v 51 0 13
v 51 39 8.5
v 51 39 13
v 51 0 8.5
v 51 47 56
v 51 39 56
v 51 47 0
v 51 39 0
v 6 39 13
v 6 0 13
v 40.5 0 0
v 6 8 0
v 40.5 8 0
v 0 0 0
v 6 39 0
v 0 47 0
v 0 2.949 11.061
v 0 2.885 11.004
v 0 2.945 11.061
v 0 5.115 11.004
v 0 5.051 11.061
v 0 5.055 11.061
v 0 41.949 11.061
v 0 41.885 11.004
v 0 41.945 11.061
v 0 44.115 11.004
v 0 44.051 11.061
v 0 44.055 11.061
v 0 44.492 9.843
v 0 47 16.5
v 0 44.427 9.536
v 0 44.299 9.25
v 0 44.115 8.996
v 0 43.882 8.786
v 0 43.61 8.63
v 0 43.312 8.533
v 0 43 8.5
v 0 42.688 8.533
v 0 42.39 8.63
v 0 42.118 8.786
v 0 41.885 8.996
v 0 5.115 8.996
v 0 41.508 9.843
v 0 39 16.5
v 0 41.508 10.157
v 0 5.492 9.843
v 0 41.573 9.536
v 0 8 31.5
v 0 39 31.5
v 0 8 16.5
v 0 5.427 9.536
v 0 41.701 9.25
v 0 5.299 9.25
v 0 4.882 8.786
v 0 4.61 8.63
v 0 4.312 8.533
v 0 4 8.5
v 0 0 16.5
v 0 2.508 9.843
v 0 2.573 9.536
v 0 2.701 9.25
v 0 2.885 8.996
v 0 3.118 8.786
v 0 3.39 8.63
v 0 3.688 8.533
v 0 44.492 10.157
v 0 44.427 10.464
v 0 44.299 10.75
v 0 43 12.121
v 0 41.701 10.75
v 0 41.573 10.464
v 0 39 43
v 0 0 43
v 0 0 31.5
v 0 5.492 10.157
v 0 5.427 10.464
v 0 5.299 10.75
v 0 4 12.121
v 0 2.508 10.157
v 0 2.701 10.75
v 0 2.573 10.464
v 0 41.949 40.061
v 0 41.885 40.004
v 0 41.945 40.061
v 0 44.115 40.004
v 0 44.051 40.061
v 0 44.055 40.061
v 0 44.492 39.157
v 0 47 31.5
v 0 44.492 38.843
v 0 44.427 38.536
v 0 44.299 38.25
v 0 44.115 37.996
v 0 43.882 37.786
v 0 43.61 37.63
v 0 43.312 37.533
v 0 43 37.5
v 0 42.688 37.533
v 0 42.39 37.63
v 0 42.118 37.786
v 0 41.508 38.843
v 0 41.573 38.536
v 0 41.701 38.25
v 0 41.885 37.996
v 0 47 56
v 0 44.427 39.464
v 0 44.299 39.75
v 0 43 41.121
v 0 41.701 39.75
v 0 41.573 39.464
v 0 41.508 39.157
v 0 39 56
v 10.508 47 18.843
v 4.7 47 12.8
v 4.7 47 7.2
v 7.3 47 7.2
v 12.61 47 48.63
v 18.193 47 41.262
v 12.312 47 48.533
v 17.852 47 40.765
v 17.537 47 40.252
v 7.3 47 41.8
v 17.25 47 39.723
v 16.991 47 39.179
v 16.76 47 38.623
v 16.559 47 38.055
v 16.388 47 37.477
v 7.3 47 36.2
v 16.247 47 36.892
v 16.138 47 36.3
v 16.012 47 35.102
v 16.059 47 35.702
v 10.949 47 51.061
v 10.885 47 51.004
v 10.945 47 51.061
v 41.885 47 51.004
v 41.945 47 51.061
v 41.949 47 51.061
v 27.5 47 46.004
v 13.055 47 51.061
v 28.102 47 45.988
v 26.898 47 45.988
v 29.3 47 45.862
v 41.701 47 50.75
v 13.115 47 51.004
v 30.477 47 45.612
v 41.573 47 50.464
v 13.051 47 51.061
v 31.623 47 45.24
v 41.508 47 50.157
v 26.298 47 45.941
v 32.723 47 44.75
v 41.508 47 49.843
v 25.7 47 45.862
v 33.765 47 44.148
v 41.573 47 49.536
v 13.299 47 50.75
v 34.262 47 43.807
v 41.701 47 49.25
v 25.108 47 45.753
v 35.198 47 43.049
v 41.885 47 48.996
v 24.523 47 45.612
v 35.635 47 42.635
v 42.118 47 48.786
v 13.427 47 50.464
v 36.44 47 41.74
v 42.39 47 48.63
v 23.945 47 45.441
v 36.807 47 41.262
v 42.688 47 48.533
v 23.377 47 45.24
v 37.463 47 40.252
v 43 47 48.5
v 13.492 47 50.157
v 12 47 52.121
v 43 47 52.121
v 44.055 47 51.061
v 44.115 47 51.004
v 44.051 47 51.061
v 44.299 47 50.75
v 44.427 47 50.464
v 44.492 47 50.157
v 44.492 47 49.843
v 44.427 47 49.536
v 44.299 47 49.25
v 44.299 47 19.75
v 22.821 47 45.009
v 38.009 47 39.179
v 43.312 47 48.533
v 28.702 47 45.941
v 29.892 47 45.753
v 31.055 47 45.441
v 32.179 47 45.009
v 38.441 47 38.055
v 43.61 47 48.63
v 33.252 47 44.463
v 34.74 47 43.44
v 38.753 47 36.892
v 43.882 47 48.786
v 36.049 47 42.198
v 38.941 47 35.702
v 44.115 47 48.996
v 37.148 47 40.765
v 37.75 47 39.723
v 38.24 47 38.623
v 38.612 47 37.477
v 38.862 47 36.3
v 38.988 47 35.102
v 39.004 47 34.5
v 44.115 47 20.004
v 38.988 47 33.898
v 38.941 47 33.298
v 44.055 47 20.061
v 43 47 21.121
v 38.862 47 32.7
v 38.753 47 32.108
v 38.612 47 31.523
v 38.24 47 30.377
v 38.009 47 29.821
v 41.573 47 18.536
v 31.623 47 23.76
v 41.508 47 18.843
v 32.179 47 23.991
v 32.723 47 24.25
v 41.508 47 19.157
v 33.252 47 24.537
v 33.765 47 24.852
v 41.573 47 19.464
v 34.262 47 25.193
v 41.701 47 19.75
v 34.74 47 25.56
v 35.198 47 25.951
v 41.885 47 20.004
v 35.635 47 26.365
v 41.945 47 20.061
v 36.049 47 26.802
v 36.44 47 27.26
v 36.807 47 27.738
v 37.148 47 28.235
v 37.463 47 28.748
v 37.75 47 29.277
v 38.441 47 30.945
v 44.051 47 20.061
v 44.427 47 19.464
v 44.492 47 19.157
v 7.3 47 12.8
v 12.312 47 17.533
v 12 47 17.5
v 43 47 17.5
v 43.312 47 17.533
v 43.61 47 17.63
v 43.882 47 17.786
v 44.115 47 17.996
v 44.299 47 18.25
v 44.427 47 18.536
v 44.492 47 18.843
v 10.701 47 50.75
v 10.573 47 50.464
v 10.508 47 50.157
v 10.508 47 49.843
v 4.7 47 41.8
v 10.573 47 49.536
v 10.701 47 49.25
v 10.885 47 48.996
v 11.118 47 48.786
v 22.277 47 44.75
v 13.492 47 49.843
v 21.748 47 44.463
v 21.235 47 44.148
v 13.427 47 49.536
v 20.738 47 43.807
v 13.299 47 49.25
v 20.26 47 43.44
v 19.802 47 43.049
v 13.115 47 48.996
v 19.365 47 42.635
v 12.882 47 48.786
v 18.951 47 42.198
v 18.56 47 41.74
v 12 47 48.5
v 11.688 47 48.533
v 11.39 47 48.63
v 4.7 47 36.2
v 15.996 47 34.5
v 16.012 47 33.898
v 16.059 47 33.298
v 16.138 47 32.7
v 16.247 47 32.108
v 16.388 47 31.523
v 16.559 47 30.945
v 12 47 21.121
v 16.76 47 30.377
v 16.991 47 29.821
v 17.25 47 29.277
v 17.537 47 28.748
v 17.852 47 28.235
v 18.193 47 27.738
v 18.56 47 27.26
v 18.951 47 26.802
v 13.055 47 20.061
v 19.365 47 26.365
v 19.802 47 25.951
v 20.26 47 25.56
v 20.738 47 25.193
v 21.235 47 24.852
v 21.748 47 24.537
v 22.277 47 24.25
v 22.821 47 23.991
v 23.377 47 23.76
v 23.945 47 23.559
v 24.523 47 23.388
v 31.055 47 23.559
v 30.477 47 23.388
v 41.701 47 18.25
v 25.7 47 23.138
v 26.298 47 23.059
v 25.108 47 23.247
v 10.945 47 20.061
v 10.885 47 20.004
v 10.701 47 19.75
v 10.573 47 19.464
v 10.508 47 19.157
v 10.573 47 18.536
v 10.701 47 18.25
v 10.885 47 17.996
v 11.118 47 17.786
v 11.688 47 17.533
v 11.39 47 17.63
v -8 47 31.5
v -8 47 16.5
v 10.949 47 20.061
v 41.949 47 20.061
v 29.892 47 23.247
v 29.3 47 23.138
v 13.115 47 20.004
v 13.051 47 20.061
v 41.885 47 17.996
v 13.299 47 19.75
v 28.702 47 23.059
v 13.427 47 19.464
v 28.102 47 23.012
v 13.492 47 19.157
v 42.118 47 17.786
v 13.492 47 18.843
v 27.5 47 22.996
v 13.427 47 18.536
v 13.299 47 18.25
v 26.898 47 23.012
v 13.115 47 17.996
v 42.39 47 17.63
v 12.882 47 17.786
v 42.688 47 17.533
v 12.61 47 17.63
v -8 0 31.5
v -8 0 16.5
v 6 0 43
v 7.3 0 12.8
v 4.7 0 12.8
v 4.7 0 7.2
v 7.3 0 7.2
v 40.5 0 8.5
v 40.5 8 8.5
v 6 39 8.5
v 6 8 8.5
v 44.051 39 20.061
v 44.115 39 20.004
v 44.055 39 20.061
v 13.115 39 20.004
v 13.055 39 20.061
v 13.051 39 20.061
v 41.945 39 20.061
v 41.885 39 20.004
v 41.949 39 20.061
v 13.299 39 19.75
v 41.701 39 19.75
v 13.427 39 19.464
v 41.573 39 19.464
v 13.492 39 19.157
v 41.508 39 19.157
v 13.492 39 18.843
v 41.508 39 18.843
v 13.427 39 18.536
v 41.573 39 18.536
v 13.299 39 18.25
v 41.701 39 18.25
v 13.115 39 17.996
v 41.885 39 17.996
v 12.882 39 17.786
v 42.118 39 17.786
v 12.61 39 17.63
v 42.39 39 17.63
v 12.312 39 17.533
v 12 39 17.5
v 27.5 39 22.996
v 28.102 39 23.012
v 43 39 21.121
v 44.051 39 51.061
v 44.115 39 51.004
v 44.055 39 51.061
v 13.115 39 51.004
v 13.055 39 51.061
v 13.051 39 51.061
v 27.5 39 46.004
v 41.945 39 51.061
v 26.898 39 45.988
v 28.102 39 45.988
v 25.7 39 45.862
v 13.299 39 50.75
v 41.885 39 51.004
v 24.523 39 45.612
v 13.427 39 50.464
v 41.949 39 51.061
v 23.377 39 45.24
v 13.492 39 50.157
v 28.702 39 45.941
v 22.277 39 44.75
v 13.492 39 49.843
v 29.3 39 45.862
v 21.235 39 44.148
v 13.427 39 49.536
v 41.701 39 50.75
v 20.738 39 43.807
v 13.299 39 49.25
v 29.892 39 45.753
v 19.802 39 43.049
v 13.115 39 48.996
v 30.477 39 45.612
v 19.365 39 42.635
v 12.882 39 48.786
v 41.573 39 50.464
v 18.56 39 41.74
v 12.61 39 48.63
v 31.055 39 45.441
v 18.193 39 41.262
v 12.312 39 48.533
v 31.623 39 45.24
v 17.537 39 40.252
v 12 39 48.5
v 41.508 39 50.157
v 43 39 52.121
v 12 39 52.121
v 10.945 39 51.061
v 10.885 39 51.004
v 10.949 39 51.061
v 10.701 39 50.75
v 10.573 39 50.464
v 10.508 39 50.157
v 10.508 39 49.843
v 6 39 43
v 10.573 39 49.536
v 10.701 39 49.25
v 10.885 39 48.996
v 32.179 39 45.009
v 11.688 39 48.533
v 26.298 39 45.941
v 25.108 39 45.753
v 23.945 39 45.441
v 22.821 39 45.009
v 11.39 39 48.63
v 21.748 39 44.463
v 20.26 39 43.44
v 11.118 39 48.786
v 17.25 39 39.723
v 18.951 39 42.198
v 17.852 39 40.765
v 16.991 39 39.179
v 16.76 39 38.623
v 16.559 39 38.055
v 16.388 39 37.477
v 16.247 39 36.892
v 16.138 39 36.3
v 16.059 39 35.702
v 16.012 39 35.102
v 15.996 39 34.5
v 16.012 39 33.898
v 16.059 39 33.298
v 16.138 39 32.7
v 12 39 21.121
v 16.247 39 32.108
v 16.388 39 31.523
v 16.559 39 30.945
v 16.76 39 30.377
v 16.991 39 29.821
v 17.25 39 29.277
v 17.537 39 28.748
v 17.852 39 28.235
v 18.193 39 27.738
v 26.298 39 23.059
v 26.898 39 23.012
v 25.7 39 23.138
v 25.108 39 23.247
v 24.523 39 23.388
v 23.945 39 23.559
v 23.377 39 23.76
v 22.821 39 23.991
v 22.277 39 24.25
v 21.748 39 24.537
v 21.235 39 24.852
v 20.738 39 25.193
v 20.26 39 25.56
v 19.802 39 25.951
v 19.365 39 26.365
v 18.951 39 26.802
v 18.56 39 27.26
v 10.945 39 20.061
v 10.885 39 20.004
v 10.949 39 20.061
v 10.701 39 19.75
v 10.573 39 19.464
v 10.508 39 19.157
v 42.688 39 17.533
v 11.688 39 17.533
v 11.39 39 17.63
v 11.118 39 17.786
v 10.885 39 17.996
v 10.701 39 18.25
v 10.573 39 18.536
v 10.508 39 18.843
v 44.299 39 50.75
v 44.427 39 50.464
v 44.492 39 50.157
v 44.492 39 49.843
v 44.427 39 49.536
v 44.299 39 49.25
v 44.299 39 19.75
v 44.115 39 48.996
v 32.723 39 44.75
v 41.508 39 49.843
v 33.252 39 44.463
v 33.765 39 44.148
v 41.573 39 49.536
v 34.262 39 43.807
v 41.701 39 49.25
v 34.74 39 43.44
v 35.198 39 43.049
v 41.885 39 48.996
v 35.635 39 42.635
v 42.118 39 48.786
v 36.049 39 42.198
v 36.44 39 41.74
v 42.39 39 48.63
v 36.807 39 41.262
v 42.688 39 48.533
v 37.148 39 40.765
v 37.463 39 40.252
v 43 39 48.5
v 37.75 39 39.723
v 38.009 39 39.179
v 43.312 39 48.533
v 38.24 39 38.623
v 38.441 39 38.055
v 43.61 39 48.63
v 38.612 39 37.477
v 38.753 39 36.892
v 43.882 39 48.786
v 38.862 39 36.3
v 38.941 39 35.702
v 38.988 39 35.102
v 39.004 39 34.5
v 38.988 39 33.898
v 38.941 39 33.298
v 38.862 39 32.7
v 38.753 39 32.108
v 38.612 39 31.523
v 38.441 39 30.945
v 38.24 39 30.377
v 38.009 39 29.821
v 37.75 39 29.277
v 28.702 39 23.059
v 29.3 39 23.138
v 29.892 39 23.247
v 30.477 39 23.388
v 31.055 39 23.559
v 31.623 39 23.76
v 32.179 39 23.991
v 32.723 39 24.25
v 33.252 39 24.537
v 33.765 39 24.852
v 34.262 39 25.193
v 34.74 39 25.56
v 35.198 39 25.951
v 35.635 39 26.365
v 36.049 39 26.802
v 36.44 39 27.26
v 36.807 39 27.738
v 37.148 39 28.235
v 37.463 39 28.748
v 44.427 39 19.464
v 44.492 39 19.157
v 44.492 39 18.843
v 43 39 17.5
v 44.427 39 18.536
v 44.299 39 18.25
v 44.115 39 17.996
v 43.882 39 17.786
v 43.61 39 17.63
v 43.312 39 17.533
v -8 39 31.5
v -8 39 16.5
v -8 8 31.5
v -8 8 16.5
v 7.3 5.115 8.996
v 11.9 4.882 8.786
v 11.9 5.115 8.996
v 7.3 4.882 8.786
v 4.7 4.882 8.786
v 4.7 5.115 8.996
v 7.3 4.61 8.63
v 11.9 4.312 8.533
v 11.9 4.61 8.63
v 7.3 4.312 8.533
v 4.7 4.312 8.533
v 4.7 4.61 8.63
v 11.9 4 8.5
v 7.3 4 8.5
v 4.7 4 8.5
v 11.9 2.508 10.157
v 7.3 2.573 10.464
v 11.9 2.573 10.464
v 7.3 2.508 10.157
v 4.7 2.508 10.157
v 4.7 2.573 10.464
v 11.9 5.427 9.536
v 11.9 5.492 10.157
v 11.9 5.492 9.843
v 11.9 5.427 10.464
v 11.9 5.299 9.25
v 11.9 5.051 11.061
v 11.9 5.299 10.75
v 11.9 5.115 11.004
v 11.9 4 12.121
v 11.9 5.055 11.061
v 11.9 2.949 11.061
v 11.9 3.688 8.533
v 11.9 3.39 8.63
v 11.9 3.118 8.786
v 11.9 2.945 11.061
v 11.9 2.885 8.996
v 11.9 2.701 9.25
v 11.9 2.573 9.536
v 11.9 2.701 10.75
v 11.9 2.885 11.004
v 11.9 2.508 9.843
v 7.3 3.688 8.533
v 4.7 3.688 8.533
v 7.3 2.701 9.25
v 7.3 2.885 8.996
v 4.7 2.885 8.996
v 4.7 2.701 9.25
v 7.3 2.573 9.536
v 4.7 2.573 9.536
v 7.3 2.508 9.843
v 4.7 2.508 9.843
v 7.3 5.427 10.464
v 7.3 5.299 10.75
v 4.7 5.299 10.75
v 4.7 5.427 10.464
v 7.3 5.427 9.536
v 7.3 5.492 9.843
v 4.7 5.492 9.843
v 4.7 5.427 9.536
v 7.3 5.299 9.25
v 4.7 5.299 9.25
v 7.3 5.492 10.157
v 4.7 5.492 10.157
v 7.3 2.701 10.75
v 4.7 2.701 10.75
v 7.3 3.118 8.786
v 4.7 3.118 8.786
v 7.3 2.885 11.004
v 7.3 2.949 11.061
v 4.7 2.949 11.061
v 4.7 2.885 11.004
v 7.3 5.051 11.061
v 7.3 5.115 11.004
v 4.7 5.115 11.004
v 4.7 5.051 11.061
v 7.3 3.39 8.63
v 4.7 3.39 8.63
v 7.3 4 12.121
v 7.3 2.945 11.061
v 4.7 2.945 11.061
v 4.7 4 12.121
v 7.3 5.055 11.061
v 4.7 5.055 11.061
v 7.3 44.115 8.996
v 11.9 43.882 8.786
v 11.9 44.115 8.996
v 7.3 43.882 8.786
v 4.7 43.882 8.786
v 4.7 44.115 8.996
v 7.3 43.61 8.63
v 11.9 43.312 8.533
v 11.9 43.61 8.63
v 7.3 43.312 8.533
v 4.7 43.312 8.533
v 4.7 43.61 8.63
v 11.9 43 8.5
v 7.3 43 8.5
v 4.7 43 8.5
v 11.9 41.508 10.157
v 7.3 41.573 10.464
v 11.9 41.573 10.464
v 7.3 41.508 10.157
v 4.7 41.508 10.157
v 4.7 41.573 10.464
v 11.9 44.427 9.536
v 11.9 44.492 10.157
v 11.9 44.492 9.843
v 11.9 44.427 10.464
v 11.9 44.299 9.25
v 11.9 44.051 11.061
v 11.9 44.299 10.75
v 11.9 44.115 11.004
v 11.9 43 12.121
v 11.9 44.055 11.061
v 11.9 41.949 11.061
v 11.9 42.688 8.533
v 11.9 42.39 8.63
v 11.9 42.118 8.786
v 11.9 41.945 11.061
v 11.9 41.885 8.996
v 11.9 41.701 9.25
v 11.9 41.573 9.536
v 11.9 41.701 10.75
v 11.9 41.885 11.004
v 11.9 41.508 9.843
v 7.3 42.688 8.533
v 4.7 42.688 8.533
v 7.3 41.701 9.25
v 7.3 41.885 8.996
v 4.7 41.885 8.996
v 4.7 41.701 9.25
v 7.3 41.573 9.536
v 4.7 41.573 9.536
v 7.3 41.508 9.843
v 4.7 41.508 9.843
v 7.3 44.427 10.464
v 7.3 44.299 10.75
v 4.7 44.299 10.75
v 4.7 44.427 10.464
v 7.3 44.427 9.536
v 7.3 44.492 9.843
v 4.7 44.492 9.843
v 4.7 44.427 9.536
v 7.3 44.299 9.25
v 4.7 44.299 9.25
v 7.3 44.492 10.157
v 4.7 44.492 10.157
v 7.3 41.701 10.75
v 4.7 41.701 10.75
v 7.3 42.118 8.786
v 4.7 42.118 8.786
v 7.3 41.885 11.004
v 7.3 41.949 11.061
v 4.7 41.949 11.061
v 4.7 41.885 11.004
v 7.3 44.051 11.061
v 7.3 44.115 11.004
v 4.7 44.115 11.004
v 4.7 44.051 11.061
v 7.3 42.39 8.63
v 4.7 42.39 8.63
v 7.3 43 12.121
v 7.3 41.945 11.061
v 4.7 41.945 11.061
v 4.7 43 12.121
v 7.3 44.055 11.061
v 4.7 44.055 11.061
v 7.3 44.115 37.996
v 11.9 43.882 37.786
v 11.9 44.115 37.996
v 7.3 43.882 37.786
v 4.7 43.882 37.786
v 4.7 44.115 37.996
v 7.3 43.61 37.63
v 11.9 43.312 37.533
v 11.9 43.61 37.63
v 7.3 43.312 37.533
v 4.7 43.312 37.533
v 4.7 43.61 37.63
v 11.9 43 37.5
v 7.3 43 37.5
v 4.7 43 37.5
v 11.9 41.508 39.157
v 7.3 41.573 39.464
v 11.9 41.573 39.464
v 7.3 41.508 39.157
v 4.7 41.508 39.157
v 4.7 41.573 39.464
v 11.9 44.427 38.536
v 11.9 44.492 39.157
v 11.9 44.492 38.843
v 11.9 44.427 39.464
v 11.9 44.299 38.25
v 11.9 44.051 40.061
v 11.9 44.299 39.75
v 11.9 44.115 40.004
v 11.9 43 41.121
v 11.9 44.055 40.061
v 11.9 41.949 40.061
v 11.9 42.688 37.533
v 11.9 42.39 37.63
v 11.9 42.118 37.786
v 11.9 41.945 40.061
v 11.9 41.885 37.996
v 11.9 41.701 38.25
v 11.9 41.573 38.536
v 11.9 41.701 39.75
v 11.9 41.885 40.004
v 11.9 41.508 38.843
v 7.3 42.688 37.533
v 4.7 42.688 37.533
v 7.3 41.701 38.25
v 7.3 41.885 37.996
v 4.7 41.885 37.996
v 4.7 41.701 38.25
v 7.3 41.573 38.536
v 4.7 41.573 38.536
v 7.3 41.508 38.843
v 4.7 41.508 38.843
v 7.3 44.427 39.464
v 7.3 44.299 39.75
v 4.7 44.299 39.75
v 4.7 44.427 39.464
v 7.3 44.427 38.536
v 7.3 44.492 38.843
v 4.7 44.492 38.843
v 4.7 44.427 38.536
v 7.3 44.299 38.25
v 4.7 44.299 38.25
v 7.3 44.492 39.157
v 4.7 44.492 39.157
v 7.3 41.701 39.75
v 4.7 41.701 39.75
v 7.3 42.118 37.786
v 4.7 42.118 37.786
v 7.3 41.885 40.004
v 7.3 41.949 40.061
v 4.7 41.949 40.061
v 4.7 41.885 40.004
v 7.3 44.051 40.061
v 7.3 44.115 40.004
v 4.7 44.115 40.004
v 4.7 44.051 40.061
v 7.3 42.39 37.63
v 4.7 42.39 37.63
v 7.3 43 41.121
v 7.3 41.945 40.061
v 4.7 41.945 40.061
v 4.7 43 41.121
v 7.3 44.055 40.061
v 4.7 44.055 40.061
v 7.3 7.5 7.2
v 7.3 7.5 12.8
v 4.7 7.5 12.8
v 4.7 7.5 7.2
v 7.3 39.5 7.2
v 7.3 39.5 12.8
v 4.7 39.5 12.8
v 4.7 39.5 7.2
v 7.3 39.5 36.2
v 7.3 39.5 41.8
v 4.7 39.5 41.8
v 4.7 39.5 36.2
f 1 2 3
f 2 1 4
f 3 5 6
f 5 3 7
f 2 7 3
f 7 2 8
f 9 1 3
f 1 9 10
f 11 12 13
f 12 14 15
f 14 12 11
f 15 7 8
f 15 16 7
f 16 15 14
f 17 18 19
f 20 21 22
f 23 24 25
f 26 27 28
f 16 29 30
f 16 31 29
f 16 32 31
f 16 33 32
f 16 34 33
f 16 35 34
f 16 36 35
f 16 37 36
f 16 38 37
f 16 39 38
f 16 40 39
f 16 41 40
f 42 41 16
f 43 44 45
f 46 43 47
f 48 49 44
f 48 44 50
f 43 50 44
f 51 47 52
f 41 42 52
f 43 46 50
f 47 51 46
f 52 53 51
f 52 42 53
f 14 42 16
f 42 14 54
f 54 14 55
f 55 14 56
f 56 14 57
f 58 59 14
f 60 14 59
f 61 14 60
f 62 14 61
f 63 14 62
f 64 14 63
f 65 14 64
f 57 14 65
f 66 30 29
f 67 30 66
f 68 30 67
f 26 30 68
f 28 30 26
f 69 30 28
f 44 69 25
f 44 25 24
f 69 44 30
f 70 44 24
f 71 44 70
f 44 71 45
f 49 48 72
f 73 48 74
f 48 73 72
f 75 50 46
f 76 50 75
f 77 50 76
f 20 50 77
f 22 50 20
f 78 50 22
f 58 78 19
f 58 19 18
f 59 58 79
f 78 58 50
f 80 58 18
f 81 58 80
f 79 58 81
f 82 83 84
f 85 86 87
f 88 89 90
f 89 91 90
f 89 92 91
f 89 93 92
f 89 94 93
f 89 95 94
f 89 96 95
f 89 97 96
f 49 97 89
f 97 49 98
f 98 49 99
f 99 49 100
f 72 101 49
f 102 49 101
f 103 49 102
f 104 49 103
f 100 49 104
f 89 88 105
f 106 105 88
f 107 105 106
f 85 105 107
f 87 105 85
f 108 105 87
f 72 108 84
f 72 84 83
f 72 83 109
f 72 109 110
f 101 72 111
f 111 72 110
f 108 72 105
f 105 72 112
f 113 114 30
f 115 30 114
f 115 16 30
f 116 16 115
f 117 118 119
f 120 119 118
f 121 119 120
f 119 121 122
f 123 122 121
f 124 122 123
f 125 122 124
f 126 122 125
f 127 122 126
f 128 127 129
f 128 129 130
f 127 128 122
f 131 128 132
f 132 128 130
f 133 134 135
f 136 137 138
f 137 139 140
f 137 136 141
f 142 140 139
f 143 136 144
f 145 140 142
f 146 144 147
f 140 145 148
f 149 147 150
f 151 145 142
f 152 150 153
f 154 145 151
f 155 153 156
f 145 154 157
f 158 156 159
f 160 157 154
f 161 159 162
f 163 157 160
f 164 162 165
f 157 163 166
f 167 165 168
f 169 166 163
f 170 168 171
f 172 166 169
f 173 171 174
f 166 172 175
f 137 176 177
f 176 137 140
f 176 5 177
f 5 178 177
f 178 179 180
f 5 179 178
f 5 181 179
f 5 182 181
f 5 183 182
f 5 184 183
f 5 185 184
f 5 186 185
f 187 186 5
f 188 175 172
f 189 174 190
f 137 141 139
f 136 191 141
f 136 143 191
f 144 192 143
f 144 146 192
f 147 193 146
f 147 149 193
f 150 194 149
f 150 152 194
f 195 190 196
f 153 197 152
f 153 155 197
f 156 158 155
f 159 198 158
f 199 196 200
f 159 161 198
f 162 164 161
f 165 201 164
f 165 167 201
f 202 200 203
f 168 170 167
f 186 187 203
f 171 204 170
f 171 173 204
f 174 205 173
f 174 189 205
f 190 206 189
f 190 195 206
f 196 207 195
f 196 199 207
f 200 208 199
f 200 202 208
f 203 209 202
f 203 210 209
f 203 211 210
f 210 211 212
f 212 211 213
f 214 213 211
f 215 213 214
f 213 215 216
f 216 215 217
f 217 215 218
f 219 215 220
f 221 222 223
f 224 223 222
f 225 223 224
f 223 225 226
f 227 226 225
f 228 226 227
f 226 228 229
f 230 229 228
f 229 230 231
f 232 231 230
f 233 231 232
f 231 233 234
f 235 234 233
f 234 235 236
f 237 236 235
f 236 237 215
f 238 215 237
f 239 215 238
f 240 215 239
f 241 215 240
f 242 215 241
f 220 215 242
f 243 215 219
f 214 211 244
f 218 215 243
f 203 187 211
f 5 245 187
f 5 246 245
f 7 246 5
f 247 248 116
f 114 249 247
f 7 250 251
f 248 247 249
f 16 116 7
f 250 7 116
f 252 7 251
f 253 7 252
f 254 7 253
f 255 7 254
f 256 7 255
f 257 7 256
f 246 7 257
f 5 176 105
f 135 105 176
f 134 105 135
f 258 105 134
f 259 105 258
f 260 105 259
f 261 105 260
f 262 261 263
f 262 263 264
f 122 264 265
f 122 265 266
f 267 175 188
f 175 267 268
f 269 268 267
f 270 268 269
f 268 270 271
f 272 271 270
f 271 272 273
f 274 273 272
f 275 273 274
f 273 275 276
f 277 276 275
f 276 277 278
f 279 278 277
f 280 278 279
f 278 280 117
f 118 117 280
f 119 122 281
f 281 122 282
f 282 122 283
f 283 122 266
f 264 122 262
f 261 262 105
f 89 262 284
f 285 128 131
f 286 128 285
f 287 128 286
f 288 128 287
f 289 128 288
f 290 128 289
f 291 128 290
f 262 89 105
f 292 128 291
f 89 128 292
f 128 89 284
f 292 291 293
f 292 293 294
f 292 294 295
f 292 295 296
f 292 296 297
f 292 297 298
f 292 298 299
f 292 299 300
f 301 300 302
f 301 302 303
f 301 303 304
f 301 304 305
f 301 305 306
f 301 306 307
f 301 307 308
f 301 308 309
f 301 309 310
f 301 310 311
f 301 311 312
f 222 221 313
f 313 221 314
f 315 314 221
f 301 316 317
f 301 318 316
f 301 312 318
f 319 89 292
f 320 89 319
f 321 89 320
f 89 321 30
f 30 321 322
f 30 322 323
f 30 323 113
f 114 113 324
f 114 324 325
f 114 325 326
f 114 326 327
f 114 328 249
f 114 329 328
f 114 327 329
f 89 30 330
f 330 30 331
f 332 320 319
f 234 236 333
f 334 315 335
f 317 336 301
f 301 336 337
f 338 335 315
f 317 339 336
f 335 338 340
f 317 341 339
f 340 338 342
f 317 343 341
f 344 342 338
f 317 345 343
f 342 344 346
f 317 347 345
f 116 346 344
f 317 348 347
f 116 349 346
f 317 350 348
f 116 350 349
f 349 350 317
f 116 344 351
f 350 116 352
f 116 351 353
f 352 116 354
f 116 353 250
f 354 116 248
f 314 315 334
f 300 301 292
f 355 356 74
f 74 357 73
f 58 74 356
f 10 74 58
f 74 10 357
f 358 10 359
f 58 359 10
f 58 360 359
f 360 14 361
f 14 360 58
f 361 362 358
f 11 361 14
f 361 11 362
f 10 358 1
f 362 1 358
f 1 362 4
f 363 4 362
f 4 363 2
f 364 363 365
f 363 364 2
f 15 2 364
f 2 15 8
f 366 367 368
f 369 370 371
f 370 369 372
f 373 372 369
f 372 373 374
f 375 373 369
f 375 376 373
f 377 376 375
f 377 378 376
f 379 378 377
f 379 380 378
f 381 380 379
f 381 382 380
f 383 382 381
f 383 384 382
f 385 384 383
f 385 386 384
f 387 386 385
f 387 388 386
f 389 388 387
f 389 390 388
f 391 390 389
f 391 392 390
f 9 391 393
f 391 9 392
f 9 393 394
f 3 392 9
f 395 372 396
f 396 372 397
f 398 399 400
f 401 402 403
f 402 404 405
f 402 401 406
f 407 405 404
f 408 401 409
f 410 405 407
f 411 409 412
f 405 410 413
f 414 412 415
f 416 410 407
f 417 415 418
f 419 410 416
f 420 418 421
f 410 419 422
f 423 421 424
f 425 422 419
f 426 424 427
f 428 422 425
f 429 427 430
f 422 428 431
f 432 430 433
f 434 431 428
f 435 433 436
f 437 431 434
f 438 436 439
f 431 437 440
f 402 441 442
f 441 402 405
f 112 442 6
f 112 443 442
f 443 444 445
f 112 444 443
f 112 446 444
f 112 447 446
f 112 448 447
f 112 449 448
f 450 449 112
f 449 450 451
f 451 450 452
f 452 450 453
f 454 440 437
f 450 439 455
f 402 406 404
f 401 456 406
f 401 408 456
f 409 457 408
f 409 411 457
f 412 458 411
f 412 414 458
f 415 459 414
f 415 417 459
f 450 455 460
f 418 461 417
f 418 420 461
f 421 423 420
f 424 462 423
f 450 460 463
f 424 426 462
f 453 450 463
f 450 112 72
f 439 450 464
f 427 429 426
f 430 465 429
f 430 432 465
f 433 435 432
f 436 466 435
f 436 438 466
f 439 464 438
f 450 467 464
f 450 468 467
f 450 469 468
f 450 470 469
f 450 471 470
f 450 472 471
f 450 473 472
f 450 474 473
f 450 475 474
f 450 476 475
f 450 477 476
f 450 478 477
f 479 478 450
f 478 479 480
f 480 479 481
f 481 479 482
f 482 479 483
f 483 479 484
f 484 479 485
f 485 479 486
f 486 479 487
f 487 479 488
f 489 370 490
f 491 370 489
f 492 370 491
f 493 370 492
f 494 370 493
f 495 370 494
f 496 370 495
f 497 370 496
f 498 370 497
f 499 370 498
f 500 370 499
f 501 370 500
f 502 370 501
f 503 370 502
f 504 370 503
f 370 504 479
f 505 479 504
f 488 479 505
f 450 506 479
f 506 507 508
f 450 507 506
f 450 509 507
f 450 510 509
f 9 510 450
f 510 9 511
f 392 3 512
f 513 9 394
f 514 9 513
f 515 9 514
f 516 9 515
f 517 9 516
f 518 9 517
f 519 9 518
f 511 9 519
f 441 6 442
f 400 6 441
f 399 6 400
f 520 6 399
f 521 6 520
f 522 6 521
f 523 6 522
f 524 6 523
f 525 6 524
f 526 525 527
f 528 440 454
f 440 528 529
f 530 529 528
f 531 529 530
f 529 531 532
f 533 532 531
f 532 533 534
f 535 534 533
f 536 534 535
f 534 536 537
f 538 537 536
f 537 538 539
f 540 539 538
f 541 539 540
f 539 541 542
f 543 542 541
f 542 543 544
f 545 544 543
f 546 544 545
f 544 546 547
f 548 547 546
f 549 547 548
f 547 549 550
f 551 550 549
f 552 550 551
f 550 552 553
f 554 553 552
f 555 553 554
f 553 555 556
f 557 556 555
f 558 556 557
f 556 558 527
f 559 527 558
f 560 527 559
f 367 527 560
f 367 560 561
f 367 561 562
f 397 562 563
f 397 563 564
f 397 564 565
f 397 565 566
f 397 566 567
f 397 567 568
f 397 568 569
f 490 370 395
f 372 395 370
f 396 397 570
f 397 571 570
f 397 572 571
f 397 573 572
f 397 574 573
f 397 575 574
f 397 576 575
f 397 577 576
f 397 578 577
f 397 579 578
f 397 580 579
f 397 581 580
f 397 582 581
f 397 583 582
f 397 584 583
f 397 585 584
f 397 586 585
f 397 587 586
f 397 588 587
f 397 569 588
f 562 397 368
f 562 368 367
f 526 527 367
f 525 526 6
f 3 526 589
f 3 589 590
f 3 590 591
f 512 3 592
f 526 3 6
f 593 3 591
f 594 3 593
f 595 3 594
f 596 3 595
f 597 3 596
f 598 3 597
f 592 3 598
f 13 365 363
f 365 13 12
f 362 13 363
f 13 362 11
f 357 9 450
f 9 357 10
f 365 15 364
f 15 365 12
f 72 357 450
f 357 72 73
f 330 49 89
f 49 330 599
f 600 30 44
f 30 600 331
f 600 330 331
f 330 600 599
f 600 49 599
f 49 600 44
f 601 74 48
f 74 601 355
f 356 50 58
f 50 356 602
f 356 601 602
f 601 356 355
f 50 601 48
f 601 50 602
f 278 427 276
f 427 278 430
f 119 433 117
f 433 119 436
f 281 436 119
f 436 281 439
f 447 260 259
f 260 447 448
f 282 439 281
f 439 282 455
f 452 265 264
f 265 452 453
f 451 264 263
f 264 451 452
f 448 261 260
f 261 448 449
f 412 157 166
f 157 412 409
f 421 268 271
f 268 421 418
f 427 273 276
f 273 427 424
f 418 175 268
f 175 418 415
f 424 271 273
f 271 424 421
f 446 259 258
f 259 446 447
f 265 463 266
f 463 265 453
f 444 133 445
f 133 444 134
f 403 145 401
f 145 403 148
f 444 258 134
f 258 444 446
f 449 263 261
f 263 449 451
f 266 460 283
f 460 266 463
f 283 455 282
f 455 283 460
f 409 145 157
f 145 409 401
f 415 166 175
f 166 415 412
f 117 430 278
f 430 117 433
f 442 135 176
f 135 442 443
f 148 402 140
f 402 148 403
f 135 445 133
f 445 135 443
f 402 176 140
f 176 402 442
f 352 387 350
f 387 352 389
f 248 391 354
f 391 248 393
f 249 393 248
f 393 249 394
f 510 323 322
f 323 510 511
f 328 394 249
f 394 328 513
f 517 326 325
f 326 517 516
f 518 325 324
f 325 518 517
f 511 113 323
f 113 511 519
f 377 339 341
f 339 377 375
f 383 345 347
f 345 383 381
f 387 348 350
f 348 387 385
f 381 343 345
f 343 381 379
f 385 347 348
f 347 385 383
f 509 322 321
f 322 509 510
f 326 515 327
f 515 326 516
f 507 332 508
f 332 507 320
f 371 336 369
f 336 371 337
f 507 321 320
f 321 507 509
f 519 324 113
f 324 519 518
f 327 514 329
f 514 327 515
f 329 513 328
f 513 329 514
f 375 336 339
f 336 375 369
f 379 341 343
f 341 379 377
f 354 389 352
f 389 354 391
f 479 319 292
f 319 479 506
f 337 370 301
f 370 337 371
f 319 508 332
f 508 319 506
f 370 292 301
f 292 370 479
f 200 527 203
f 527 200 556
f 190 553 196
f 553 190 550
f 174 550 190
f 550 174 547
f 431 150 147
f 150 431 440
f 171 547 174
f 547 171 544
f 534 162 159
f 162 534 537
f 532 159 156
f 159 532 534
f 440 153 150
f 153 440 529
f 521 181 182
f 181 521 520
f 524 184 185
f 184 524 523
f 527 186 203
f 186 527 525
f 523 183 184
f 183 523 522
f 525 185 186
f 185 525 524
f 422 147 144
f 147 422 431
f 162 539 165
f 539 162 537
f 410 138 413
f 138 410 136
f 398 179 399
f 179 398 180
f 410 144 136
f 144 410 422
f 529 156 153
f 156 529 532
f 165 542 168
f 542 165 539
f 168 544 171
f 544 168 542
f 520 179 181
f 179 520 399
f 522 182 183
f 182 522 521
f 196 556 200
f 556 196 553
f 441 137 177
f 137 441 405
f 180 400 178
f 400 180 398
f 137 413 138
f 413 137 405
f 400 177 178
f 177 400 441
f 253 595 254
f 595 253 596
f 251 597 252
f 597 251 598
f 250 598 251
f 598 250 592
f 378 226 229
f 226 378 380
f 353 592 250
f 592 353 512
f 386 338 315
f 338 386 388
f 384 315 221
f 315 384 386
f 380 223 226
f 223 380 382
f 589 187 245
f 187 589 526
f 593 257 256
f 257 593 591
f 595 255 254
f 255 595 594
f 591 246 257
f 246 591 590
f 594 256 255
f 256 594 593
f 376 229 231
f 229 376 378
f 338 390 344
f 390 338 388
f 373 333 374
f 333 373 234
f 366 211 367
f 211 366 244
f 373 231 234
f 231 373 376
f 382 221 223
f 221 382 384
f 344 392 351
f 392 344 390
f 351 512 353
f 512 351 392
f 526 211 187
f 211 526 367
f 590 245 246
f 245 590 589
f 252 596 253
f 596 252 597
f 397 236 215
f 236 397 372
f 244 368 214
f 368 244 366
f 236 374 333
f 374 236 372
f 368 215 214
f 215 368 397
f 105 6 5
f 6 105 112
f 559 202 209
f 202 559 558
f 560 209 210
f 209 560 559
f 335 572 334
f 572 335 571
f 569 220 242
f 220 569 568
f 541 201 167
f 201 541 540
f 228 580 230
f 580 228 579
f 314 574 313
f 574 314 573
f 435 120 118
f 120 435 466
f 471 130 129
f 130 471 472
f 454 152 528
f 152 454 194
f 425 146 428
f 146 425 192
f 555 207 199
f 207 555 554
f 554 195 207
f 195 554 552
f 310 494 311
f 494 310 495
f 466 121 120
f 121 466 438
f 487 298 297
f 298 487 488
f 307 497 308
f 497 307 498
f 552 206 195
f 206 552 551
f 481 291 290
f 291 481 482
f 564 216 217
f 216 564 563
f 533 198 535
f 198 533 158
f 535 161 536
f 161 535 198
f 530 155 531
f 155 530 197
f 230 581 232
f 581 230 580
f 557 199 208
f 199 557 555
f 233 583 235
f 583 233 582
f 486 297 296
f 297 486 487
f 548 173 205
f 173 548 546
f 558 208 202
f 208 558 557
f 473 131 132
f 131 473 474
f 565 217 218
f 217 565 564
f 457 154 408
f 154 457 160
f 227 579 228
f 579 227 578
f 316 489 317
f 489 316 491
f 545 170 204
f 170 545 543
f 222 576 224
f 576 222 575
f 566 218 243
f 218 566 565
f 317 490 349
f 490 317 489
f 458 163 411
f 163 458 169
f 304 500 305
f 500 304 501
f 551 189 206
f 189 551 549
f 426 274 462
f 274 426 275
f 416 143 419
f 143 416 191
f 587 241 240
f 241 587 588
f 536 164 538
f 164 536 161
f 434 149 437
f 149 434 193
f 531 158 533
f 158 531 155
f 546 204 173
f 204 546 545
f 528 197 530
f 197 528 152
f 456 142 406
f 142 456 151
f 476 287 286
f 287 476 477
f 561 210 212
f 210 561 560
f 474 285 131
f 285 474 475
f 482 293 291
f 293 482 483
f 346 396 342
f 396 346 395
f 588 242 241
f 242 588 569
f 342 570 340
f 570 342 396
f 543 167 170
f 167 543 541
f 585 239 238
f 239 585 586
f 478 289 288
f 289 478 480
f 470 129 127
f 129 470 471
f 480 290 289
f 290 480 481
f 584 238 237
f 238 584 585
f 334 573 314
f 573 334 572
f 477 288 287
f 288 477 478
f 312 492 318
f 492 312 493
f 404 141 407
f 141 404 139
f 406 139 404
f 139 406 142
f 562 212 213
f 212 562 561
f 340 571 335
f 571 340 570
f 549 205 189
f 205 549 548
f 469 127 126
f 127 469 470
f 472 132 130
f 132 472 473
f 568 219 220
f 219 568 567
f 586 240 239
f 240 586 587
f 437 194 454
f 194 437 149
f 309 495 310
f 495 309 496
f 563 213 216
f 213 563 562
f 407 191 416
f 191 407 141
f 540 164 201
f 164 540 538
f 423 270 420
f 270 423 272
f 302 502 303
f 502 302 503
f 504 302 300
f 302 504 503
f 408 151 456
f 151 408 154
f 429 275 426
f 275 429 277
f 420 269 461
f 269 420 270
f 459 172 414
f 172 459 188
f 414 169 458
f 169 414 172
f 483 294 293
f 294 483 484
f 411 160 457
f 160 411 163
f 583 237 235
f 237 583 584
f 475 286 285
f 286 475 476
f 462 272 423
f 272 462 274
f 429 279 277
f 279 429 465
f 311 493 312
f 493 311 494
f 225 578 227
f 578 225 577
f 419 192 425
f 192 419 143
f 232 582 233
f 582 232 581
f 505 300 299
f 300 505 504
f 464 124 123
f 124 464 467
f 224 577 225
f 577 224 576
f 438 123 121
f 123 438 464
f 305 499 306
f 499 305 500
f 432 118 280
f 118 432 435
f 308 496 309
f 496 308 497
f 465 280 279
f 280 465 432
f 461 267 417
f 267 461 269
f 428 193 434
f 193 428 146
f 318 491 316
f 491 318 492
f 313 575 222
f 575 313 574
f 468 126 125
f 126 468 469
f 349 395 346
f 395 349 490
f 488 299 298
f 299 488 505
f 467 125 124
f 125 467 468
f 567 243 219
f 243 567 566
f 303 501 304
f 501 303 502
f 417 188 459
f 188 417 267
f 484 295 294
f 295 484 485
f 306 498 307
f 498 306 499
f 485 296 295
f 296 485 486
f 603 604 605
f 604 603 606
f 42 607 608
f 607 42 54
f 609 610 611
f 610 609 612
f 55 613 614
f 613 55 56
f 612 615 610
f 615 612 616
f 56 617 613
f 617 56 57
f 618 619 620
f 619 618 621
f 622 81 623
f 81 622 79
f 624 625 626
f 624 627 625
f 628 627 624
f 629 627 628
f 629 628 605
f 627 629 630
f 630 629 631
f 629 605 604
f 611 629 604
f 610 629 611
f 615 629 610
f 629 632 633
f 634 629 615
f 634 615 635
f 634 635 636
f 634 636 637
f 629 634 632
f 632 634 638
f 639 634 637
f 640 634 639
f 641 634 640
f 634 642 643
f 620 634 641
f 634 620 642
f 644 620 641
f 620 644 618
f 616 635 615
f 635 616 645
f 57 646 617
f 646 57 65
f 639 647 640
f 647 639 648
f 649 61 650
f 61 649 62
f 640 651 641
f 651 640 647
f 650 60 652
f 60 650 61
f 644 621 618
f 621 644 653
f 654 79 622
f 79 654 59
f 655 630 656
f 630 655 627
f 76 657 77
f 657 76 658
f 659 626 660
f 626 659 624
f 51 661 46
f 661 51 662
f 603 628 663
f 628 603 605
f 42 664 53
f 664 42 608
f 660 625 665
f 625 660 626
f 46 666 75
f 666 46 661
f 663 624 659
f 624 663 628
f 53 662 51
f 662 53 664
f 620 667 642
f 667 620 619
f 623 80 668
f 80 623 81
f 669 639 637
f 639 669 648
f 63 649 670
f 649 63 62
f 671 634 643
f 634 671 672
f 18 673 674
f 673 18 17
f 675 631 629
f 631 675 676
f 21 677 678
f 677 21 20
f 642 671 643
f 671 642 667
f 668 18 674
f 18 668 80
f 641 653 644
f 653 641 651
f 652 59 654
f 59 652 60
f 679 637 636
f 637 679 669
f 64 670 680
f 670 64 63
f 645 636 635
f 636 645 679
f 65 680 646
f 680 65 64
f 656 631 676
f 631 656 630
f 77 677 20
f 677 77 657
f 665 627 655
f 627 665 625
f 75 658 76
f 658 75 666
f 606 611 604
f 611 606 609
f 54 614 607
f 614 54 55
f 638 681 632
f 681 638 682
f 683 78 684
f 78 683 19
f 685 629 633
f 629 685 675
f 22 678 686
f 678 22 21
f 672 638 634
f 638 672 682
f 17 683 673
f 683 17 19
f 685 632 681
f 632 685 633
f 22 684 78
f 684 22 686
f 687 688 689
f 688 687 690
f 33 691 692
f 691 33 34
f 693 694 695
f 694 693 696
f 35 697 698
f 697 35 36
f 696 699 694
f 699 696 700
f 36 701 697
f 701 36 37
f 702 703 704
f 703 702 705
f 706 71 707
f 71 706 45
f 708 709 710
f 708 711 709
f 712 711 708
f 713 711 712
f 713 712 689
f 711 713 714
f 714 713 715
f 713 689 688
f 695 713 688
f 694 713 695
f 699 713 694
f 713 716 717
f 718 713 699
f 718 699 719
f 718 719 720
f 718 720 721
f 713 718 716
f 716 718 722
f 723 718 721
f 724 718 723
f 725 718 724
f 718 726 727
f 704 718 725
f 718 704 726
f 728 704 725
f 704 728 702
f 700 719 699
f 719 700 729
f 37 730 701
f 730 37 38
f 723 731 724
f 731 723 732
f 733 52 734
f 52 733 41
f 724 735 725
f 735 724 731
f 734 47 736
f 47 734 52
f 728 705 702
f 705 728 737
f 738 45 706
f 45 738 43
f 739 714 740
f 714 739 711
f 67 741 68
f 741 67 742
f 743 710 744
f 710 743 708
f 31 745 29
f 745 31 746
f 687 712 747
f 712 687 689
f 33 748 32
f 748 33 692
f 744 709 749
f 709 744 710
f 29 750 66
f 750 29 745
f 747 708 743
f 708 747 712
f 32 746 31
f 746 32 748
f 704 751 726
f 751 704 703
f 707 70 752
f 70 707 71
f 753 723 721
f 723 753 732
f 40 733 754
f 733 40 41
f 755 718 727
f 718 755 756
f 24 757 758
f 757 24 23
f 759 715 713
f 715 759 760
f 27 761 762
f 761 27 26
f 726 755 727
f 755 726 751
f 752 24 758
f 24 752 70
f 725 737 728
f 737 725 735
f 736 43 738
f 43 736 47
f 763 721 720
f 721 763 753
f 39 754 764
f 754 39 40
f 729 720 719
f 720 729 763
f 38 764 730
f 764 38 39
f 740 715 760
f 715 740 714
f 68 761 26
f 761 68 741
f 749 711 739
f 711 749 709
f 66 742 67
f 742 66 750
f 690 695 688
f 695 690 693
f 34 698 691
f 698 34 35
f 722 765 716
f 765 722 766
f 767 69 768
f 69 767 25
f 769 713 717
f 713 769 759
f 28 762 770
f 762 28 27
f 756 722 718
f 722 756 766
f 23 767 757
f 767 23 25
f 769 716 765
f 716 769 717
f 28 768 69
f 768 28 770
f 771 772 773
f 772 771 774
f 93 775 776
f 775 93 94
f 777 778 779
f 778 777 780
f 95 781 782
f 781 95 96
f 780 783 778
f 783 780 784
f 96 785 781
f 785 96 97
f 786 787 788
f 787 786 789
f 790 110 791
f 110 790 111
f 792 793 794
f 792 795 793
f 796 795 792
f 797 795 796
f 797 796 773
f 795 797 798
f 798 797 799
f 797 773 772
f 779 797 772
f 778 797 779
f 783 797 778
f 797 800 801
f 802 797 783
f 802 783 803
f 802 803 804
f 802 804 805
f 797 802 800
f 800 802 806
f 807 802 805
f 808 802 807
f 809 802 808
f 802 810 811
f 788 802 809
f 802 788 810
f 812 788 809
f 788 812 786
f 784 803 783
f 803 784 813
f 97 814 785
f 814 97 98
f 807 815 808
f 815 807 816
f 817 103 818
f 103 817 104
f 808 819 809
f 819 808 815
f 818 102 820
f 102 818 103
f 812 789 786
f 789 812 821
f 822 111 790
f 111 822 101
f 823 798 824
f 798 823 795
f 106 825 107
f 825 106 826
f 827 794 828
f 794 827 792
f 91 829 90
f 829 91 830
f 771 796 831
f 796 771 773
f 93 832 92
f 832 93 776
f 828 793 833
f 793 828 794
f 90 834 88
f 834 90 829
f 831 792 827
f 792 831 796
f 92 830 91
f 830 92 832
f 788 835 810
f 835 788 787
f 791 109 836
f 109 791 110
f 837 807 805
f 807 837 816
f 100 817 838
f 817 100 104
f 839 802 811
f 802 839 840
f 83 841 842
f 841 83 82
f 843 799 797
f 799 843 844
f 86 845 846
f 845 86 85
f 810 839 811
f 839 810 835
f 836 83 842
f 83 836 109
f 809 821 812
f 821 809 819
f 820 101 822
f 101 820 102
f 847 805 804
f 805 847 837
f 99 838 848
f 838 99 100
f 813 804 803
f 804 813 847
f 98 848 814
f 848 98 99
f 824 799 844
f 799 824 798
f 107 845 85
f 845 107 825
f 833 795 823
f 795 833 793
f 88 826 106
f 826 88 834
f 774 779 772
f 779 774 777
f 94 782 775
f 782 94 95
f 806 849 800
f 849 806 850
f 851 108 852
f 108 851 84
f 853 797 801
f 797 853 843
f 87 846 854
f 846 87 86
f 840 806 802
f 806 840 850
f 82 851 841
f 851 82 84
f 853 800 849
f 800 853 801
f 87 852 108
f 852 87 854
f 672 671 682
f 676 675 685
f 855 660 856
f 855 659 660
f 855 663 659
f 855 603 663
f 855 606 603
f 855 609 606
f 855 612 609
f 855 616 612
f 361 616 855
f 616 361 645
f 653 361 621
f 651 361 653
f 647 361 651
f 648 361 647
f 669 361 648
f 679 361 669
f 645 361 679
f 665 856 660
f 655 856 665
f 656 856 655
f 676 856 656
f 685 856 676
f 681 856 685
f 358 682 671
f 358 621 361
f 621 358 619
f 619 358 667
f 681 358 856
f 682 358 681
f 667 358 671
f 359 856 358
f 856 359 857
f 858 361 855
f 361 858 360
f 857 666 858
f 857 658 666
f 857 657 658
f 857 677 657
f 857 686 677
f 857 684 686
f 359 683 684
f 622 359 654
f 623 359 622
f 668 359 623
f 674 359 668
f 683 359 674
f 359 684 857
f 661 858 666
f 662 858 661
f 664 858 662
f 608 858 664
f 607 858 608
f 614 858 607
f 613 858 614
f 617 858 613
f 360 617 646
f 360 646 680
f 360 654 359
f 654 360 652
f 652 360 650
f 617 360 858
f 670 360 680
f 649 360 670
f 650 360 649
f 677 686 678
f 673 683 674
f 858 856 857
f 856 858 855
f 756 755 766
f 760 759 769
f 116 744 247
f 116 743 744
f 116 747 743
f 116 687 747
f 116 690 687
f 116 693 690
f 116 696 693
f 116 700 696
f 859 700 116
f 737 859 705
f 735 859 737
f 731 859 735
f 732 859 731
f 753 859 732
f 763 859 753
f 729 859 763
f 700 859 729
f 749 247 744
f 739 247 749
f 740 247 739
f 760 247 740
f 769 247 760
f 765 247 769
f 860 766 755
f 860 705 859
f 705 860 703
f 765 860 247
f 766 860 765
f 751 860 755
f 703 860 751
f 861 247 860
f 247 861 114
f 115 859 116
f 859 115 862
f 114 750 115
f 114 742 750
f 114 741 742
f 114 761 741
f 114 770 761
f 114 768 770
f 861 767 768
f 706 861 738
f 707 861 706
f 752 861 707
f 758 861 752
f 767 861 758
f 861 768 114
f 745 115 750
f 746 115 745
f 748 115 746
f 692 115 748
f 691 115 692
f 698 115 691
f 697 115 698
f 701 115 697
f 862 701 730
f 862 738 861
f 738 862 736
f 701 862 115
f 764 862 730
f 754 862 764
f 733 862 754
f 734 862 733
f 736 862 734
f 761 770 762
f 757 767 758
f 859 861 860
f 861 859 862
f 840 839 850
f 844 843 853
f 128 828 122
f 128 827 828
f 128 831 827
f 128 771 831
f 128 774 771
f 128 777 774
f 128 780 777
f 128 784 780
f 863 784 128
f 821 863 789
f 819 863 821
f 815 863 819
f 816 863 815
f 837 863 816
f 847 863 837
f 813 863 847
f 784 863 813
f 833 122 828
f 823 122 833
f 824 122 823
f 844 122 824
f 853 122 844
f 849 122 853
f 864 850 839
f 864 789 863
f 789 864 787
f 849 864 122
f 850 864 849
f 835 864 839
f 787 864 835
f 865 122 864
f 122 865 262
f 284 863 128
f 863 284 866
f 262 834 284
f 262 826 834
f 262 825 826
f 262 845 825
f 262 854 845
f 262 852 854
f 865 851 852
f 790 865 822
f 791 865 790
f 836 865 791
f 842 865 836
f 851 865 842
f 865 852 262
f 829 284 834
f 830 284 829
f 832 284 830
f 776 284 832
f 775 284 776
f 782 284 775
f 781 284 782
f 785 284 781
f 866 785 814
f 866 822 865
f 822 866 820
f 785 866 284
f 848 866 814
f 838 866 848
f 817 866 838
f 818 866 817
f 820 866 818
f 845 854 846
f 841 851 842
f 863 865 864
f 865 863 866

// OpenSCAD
// Customizable Y Motor Mount for Anet A6
// Copyright: Olle Wreede 2019
// License: CC BY-SA

//CUSTOMIZER VARIABLES

// Thickness in mm of backplate
backplate_thickness = 6; // [4:10]

// Height in mm of cutout of bottom
bottom_cutout_height = 8.5; // [6:0.5:10]

// Distance in mm that motor is lowered from default height
motor_lowered_by = 2; // [0:0.1:4]

// Width in mm of hole for back frame brace
width_of_opening_for_back_frame_brace = 10.5; // [0:15]

// Use round or teardrop mount holes
type_of_mount_hole = "Teardrop"; // [Teardrop, Round]

// Diameter in mm of mount hole
mount_hole_diameter = 3; // [2:0.1:4]

// Length in mm of mount hole
mount_hole_length = 12; // [8:0.1:14]

// Depth in mm of hole for trapped nut
depth_of_trapped_nut_hole = 2.6; // [2:0.1:4]

// Width in mm of hole for trapped nut
width_of_trapped_nut_hole = 7.5; // [6:0.1:10]

// Height in mm of hole for trapped nut
height_of_trapped_nut_hole = 5.6; // [4:0.1:8]

//CUSTOMIZER VARIABLES END

/* [Hidden] */

height_of_base = 15 - motor_lowered_by;

$fn=120;


/* From http://www.thingiverse.com/thing:3457
   © 2010 whosawhatsis */
module teardrop(radius, length, angle) {
	rotate([0, angle, 0]) union() {
		linear_extrude(height = length, center = true, convexity = radius, twist = 0)
			circle(r = radius, center = true, $fn = 30);
		linear_extrude(height = length, center = true, convexity = radius, twist = 0)
			projection(cut = false) rotate([0, -angle, 0]) translate([0, 0, radius * sin(45) * 1.5]) cylinder(h = radius * sin(45), r1 = radius * sin(45), r2 = 0, center = true, $fn = 30);
    }
}

module cylinder_outer(diameter, height, fn) {
   fudge = 1 / cos(180 / fn);
   cylinder(h=height, r=diameter / 2 * fudge, $fn=fn, center=true);
}

module mount_hole(diameter, length) {
    if (type_of_mount_hole == "Teardrop") {
        rotate([0, 270, 0])
        teardrop(diameter/2, length, 90);
    } else {
        cylinder_outer(diameter, length, $fn);
    }
}

module motor_mount_plate() {
    translate([51/2, 47 - 8/2, 56/2])
    difference() {
        cube([51, 8, 56], center=true);
        // Maybe decrease 0.1mm to add clearance for back frame brace
        
        // Motor shaft hole
        translate([6/3, 0, height_of_base/2])
        rotate([90, 0, 0])
        cylinder_outer(23, 8 + 0.1, $fn);
        
        // Motor mount holes
        translate([6/3 - 31/2, 0, height_of_base/2 + 31/2])
        rotate([90, 90, 0])
        mount_hole(mount_hole_diameter, 8 + 0.1, $fn);
        
        translate([6/3 - 31/2, 0, height_of_base/2 - 31/2])
        rotate([90, 90, 0])
        mount_hole(mount_hole_diameter, 8 + 0.1, $fn);
        
        translate([6/3 + 31/2, 0, height_of_base/2 + 31/2])
        rotate([90, 90, 0])
        mount_hole(mount_hole_diameter, 8 + 0.1, $fn);
 
        translate([6/3 + 31/2, 0, height_of_base/2 - 31/2])
        rotate([90, 90, 0])
        mount_hole(mount_hole_diameter, 8 + 0.1, $fn);
   }    
}

module bottom_plate() {
    translate([51/2, 47/2, height_of_base/2])
    difference() {
        cube([51, 47, height_of_base], center=true);
        // Optionally increase with 6mm to support dampener
        // Add holes in bottom to decrease plastic usage

        translate([0, 0, bottom_cutout_height/2 - height_of_base/2])
        cube([51, 31, bottom_cutout_height], center=true);

        // Leave opening for back frame brace
        if (width_of_opening_for_back_frame_brace > 0) {
            translate([51/2 - width_of_opening_for_back_frame_brace/2, 8/2 - 47/2, bottom_cutout_height/2 - height_of_base/2])
            cube([width_of_opening_for_back_frame_brace, 8, bottom_cutout_height], center=true);
        }
    }
}

module back_plate() {
    translate([3, 47/2, 43/2])
    cube([backplate_thickness, 47, 43], center=true);
    
    translate([-4, 47 - 8/2, 16.5 + 15/2])
    cube([8, 8, 15], center=true);
    
    translate([-4, 8/2, 16.5 + 15/2])
    cube([8, 8, 15], center=true);
}

module backplate_mount_holes() {
    translate([mount_hole_length/2 - 0.1, 4, 10])
    rotate([0, 90, 0])
    mount_hole(mount_hole_diameter, mount_hole_length);
    
    // Trapped nut hole
    translate([backplate_thickness, width_of_trapped_nut_hole/2, 10])
    cube([depth_of_trapped_nut_hole, width_of_trapped_nut_hole, height_of_trapped_nut_hole], center=true);

    translate([mount_hole_length/2 - 0.1, 47-4, 10])
    rotate([0, 90, 0])
    mount_hole(mount_hole_diameter, mount_hole_length);

    // Trapped nut hole
    translate([backplate_thickness, 47 - width_of_trapped_nut_hole/2, 10])
    cube([depth_of_trapped_nut_hole, width_of_trapped_nut_hole, height_of_trapped_nut_hole], center=true);

    translate([mount_hole_length/2 - 0.1, 47-4, 39])
    rotate([0, 90, 0])
    mount_hole(mount_hole_diameter, mount_hole_length);
    
    // Trapped nut hole
    translate([backplate_thickness, 47 - width_of_trapped_nut_hole/2, 39])
    cube([depth_of_trapped_nut_hole, width_of_trapped_nut_hole, height_of_trapped_nut_hole], center=true);
}

module motor_mount() {
    difference() {
        union() {
            bottom_plate();
            back_plate();
            motor_mount_plate();
        }
        
        backplate_mount_holes();
    }
}

motor_mount();
